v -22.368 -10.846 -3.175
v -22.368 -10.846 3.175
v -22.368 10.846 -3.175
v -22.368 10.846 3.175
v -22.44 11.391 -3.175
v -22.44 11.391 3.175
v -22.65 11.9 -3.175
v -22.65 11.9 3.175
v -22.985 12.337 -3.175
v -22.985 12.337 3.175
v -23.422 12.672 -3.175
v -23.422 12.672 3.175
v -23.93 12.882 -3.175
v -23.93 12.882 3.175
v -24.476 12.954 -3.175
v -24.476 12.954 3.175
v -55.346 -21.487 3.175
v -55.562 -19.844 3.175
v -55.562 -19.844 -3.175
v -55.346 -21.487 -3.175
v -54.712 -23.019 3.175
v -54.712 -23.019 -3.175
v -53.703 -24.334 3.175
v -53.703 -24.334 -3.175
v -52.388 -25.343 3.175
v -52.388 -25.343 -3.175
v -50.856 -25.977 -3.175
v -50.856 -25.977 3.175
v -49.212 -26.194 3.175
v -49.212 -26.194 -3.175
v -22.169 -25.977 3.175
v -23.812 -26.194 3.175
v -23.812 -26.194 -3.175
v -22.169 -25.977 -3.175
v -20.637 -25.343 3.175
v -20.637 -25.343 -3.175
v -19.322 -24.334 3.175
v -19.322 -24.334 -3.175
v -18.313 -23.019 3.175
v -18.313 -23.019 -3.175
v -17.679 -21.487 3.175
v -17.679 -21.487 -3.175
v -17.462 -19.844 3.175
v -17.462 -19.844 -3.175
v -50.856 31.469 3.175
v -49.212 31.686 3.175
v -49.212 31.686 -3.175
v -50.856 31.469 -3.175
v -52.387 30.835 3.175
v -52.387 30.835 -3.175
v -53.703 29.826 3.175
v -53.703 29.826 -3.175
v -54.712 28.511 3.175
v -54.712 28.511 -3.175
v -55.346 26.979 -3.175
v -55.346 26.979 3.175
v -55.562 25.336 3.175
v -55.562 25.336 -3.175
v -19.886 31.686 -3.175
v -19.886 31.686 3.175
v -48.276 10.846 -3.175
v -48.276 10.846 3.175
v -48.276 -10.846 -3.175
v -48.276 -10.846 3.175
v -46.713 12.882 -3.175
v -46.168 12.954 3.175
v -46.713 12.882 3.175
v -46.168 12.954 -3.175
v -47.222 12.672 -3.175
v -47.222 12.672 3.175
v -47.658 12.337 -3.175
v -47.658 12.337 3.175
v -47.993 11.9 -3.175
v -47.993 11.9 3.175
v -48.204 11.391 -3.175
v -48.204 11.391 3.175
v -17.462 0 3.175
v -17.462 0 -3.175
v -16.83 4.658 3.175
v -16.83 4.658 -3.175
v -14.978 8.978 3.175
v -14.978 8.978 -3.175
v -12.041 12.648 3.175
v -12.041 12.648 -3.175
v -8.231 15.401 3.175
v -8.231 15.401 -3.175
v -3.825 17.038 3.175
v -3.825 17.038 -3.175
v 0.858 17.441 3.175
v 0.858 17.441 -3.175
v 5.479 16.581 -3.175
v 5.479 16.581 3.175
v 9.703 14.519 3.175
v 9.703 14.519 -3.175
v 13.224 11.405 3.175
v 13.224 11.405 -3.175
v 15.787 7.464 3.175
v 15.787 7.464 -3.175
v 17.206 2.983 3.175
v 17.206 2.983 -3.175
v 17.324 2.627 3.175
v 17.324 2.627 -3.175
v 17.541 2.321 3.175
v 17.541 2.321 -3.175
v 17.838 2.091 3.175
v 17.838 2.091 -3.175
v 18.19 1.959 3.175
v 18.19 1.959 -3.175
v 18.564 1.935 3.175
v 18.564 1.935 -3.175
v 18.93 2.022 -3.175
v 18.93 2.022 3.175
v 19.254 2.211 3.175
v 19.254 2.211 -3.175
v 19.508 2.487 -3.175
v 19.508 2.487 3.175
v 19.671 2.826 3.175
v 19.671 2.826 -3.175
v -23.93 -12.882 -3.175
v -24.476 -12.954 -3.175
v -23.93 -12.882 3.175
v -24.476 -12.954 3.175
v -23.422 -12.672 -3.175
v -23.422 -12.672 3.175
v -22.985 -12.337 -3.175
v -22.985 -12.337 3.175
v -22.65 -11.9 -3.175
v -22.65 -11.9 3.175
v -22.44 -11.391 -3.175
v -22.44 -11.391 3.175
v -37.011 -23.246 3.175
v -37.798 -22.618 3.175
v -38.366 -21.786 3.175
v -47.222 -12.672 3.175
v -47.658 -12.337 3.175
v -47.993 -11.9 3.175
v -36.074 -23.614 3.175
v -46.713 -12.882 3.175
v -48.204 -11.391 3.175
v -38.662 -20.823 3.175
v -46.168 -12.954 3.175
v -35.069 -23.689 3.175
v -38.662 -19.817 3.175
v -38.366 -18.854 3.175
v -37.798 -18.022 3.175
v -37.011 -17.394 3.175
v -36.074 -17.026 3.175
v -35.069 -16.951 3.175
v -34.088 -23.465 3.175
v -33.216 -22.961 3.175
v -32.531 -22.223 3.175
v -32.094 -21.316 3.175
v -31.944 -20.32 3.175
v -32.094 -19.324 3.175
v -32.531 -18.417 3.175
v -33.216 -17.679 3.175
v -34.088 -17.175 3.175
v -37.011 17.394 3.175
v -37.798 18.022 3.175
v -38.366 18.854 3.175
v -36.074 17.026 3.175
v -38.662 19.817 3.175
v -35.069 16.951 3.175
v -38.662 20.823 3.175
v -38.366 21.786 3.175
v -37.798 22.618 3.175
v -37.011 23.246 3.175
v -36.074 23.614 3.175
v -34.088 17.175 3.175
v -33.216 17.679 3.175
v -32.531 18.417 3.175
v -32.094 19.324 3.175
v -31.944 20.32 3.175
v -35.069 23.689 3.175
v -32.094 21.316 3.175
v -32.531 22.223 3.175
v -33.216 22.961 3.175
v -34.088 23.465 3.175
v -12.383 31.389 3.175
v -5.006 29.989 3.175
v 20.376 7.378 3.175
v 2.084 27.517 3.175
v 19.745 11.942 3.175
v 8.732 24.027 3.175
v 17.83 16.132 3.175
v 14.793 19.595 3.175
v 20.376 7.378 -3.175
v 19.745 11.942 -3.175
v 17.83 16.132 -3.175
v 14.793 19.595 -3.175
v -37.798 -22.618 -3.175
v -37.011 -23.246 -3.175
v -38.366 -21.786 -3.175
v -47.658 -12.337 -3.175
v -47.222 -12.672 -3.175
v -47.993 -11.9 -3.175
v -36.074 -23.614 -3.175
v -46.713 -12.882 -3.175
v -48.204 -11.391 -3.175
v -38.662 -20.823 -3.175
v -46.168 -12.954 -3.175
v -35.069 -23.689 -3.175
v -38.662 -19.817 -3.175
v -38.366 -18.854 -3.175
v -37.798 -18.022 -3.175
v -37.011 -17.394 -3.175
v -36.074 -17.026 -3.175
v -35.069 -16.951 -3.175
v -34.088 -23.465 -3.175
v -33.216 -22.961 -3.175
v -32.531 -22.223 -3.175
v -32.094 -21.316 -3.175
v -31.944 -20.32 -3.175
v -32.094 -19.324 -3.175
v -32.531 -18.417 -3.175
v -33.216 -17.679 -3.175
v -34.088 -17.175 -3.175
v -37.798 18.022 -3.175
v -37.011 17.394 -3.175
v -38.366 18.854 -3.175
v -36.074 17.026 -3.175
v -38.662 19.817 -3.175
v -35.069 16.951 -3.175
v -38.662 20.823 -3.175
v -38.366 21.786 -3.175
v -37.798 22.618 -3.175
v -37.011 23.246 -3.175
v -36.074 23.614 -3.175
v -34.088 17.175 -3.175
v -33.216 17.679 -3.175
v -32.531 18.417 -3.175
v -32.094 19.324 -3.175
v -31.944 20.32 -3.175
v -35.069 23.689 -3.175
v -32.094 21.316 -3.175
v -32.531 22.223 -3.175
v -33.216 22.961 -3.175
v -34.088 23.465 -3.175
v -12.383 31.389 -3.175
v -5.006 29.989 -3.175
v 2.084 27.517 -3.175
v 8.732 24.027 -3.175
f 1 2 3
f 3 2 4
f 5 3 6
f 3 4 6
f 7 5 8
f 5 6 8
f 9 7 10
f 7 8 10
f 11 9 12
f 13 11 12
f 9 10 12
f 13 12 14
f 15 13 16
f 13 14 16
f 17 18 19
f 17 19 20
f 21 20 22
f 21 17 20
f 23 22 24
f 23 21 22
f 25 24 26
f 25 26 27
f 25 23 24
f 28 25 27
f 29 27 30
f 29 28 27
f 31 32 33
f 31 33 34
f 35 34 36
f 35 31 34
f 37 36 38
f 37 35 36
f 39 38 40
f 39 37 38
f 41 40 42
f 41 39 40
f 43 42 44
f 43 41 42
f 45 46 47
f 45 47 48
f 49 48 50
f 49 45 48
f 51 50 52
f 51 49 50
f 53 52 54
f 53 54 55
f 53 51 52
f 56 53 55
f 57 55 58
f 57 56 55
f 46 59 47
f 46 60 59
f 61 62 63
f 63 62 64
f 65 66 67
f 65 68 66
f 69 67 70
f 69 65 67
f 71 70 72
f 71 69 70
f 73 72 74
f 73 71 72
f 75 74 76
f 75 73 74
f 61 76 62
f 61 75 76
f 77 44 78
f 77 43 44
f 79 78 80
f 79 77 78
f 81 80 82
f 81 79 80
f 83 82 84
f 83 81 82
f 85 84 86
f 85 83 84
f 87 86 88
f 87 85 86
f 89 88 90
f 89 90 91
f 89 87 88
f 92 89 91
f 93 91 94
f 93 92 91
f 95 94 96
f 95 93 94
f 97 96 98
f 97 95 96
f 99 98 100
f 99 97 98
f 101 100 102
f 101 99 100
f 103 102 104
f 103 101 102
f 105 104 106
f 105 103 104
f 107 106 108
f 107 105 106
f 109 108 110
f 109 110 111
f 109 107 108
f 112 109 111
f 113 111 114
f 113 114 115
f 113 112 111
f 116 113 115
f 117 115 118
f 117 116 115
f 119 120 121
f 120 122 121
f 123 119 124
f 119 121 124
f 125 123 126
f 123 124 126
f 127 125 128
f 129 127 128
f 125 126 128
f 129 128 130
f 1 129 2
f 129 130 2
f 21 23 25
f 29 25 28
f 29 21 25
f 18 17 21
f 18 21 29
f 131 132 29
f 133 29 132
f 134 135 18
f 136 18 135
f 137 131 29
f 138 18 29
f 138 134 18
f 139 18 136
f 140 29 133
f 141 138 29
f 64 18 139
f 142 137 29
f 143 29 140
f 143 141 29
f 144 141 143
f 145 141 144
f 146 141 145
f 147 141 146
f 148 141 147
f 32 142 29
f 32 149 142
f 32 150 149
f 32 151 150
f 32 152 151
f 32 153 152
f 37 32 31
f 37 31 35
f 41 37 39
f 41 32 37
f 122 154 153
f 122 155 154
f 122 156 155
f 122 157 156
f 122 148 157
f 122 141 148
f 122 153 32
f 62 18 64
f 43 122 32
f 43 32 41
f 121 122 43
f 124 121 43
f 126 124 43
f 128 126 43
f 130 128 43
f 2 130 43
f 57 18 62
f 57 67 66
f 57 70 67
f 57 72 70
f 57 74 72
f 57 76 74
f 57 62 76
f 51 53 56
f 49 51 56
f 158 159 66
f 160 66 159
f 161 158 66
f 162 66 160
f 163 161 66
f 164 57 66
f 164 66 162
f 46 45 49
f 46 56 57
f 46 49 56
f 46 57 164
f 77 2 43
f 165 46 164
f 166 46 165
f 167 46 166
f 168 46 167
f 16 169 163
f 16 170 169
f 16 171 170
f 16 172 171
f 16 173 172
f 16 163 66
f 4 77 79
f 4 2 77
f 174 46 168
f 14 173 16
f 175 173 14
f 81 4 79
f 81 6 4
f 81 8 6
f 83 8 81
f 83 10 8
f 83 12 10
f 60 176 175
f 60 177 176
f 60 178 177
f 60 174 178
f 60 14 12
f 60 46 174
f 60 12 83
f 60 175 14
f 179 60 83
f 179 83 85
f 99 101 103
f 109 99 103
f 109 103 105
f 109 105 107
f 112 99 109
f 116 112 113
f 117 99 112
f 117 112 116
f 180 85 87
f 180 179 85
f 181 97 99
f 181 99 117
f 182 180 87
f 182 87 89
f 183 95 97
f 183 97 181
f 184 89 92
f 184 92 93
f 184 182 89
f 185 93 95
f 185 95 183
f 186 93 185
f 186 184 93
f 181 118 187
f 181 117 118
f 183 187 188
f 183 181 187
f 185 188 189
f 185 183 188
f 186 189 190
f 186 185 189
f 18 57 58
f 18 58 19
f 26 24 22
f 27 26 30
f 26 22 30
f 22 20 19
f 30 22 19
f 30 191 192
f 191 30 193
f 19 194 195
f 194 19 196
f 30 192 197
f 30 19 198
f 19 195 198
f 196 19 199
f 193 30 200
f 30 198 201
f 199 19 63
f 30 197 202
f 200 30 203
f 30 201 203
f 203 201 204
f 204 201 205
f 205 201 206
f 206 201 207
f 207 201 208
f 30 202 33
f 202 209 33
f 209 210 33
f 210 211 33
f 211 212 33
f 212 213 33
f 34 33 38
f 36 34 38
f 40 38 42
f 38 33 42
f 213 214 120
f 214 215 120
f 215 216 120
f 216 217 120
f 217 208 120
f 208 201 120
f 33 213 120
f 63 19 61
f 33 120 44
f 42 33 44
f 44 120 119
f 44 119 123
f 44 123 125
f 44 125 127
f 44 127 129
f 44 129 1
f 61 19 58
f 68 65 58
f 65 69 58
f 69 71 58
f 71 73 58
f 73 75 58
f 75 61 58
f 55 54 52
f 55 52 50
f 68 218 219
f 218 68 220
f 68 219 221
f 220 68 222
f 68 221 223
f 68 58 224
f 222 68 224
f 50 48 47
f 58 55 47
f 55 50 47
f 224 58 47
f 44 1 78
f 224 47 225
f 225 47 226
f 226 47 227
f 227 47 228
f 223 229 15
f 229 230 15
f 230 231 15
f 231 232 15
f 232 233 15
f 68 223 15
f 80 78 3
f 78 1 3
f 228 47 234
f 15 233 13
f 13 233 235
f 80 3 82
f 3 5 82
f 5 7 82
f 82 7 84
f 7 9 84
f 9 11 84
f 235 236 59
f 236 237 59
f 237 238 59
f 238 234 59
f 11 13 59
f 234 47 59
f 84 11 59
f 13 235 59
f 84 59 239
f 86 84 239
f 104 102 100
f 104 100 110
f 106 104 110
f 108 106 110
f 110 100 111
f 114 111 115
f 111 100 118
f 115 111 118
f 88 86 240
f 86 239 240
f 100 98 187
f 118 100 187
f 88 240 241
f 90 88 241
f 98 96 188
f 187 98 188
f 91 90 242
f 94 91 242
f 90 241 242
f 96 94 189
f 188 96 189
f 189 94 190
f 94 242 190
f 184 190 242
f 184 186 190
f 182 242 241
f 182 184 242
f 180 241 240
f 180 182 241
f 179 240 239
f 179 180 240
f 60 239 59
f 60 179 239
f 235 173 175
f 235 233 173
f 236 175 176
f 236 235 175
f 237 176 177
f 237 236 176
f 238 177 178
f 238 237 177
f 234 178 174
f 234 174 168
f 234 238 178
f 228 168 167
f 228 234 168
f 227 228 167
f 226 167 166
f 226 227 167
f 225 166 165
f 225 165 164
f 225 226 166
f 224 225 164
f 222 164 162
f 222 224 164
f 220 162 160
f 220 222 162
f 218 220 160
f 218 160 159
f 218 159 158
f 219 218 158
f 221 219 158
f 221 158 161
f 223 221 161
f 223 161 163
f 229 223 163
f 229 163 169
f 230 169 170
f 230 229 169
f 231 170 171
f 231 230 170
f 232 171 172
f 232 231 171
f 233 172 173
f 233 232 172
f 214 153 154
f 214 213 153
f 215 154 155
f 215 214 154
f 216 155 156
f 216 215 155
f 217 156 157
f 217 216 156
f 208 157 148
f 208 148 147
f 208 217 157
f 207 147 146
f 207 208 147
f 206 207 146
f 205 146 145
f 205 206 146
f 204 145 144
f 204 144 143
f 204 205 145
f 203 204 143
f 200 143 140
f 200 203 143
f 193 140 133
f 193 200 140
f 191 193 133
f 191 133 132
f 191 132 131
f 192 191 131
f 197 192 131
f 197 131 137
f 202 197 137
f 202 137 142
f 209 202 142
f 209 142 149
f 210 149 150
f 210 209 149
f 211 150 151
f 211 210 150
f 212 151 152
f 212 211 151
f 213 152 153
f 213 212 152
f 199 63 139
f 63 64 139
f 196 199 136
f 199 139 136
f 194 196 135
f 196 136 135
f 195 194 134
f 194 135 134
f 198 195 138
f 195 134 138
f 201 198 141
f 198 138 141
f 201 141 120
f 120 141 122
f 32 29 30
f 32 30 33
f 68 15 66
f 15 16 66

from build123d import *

# Parameters (mm, degrees)
SKETCH1_R           = 3.3782
BOSS_EXTRUDE1_DEPTH = 3.175


with BuildPart() as part:
    # Sketch1 → Boss-Extrude1 (new body, symmetric)
    with BuildSketch(Plane.XY):
        with BuildLine():
            Line((-19.885725358, 31.685738515), (-49.2125, 31.685738515))
            ThreePointArc((-49.2125, 31.685738515), (-53.702628061, 29.825866575), (-55.5625, 25.335738515))
            Line((-55.5625, 25.335738515), (-55.5625, -19.84375))
            ThreePointArc((-55.5625, -19.84375), (-53.702628061, -24.333878061), (-49.2125, -26.19375))
            Line((-49.2125, -26.19375), (-23.8125, -26.19375))
            ThreePointArc((-23.8125, -26.19375), (-19.322371939, -24.333878061), (-17.4625, -19.84375))
            Line((-17.4625, -19.84375), (-17.4625, 0))
            ThreePointArc((-17.4625, 0), (-1.497194511, 17.398198609), (17.205767985, 2.983362915))
            ThreePointArc((17.205767985, 2.983362915), (18.376051148, 1.93292337), (19.670597549, 2.825747839))
            ThreePointArc((19.670597549, 2.825747839), (19.745172941, 11.941624881), (14.793099056, 19.595495794))
            ThreePointArc((14.793099056, 19.595495794), (-1.415498584, 28.884168232), (-19.885725358, 31.685738515))
        make_face()
        with Locations((-35.321875, -20.32)):
            Circle(SKETCH1_R, mode=Mode.SUBTRACT)
        with Locations((-35.321875, 20.32)):
            Circle(SKETCH1_R, mode=Mode.SUBTRACT)
        with BuildLine():
            Line((-48.275875, 10.8458), (-48.275875, -10.8458))
            ThreePointArc((-48.275875, -10.8458), (-47.658397516, -12.336522516), (-46.167675, -12.954))
            Line((-46.167675, -12.954), (-24.476075, -12.954))
            ThreePointArc((-24.476075, -12.954), (-22.985352484, -12.336522516), (-22.367875, -10.8458))
            Line((-22.367875, -10.8458), (-22.367875, 10.8458))
            ThreePointArc((-22.367875, 10.8458), (-22.985352484, 12.336522516), (-24.476075, 12.954))
            Line((-24.476075, 12.954), (-46.167675, 12.954))
            ThreePointArc((-46.167675, 12.954), (-47.658397516, 12.336522516), (-48.275875, 10.8458))
        make_face(mode=Mode.SUBTRACT)
    extrude(amount=BOSS_EXTRUDE1_DEPTH, both=True)


solid = part.part
